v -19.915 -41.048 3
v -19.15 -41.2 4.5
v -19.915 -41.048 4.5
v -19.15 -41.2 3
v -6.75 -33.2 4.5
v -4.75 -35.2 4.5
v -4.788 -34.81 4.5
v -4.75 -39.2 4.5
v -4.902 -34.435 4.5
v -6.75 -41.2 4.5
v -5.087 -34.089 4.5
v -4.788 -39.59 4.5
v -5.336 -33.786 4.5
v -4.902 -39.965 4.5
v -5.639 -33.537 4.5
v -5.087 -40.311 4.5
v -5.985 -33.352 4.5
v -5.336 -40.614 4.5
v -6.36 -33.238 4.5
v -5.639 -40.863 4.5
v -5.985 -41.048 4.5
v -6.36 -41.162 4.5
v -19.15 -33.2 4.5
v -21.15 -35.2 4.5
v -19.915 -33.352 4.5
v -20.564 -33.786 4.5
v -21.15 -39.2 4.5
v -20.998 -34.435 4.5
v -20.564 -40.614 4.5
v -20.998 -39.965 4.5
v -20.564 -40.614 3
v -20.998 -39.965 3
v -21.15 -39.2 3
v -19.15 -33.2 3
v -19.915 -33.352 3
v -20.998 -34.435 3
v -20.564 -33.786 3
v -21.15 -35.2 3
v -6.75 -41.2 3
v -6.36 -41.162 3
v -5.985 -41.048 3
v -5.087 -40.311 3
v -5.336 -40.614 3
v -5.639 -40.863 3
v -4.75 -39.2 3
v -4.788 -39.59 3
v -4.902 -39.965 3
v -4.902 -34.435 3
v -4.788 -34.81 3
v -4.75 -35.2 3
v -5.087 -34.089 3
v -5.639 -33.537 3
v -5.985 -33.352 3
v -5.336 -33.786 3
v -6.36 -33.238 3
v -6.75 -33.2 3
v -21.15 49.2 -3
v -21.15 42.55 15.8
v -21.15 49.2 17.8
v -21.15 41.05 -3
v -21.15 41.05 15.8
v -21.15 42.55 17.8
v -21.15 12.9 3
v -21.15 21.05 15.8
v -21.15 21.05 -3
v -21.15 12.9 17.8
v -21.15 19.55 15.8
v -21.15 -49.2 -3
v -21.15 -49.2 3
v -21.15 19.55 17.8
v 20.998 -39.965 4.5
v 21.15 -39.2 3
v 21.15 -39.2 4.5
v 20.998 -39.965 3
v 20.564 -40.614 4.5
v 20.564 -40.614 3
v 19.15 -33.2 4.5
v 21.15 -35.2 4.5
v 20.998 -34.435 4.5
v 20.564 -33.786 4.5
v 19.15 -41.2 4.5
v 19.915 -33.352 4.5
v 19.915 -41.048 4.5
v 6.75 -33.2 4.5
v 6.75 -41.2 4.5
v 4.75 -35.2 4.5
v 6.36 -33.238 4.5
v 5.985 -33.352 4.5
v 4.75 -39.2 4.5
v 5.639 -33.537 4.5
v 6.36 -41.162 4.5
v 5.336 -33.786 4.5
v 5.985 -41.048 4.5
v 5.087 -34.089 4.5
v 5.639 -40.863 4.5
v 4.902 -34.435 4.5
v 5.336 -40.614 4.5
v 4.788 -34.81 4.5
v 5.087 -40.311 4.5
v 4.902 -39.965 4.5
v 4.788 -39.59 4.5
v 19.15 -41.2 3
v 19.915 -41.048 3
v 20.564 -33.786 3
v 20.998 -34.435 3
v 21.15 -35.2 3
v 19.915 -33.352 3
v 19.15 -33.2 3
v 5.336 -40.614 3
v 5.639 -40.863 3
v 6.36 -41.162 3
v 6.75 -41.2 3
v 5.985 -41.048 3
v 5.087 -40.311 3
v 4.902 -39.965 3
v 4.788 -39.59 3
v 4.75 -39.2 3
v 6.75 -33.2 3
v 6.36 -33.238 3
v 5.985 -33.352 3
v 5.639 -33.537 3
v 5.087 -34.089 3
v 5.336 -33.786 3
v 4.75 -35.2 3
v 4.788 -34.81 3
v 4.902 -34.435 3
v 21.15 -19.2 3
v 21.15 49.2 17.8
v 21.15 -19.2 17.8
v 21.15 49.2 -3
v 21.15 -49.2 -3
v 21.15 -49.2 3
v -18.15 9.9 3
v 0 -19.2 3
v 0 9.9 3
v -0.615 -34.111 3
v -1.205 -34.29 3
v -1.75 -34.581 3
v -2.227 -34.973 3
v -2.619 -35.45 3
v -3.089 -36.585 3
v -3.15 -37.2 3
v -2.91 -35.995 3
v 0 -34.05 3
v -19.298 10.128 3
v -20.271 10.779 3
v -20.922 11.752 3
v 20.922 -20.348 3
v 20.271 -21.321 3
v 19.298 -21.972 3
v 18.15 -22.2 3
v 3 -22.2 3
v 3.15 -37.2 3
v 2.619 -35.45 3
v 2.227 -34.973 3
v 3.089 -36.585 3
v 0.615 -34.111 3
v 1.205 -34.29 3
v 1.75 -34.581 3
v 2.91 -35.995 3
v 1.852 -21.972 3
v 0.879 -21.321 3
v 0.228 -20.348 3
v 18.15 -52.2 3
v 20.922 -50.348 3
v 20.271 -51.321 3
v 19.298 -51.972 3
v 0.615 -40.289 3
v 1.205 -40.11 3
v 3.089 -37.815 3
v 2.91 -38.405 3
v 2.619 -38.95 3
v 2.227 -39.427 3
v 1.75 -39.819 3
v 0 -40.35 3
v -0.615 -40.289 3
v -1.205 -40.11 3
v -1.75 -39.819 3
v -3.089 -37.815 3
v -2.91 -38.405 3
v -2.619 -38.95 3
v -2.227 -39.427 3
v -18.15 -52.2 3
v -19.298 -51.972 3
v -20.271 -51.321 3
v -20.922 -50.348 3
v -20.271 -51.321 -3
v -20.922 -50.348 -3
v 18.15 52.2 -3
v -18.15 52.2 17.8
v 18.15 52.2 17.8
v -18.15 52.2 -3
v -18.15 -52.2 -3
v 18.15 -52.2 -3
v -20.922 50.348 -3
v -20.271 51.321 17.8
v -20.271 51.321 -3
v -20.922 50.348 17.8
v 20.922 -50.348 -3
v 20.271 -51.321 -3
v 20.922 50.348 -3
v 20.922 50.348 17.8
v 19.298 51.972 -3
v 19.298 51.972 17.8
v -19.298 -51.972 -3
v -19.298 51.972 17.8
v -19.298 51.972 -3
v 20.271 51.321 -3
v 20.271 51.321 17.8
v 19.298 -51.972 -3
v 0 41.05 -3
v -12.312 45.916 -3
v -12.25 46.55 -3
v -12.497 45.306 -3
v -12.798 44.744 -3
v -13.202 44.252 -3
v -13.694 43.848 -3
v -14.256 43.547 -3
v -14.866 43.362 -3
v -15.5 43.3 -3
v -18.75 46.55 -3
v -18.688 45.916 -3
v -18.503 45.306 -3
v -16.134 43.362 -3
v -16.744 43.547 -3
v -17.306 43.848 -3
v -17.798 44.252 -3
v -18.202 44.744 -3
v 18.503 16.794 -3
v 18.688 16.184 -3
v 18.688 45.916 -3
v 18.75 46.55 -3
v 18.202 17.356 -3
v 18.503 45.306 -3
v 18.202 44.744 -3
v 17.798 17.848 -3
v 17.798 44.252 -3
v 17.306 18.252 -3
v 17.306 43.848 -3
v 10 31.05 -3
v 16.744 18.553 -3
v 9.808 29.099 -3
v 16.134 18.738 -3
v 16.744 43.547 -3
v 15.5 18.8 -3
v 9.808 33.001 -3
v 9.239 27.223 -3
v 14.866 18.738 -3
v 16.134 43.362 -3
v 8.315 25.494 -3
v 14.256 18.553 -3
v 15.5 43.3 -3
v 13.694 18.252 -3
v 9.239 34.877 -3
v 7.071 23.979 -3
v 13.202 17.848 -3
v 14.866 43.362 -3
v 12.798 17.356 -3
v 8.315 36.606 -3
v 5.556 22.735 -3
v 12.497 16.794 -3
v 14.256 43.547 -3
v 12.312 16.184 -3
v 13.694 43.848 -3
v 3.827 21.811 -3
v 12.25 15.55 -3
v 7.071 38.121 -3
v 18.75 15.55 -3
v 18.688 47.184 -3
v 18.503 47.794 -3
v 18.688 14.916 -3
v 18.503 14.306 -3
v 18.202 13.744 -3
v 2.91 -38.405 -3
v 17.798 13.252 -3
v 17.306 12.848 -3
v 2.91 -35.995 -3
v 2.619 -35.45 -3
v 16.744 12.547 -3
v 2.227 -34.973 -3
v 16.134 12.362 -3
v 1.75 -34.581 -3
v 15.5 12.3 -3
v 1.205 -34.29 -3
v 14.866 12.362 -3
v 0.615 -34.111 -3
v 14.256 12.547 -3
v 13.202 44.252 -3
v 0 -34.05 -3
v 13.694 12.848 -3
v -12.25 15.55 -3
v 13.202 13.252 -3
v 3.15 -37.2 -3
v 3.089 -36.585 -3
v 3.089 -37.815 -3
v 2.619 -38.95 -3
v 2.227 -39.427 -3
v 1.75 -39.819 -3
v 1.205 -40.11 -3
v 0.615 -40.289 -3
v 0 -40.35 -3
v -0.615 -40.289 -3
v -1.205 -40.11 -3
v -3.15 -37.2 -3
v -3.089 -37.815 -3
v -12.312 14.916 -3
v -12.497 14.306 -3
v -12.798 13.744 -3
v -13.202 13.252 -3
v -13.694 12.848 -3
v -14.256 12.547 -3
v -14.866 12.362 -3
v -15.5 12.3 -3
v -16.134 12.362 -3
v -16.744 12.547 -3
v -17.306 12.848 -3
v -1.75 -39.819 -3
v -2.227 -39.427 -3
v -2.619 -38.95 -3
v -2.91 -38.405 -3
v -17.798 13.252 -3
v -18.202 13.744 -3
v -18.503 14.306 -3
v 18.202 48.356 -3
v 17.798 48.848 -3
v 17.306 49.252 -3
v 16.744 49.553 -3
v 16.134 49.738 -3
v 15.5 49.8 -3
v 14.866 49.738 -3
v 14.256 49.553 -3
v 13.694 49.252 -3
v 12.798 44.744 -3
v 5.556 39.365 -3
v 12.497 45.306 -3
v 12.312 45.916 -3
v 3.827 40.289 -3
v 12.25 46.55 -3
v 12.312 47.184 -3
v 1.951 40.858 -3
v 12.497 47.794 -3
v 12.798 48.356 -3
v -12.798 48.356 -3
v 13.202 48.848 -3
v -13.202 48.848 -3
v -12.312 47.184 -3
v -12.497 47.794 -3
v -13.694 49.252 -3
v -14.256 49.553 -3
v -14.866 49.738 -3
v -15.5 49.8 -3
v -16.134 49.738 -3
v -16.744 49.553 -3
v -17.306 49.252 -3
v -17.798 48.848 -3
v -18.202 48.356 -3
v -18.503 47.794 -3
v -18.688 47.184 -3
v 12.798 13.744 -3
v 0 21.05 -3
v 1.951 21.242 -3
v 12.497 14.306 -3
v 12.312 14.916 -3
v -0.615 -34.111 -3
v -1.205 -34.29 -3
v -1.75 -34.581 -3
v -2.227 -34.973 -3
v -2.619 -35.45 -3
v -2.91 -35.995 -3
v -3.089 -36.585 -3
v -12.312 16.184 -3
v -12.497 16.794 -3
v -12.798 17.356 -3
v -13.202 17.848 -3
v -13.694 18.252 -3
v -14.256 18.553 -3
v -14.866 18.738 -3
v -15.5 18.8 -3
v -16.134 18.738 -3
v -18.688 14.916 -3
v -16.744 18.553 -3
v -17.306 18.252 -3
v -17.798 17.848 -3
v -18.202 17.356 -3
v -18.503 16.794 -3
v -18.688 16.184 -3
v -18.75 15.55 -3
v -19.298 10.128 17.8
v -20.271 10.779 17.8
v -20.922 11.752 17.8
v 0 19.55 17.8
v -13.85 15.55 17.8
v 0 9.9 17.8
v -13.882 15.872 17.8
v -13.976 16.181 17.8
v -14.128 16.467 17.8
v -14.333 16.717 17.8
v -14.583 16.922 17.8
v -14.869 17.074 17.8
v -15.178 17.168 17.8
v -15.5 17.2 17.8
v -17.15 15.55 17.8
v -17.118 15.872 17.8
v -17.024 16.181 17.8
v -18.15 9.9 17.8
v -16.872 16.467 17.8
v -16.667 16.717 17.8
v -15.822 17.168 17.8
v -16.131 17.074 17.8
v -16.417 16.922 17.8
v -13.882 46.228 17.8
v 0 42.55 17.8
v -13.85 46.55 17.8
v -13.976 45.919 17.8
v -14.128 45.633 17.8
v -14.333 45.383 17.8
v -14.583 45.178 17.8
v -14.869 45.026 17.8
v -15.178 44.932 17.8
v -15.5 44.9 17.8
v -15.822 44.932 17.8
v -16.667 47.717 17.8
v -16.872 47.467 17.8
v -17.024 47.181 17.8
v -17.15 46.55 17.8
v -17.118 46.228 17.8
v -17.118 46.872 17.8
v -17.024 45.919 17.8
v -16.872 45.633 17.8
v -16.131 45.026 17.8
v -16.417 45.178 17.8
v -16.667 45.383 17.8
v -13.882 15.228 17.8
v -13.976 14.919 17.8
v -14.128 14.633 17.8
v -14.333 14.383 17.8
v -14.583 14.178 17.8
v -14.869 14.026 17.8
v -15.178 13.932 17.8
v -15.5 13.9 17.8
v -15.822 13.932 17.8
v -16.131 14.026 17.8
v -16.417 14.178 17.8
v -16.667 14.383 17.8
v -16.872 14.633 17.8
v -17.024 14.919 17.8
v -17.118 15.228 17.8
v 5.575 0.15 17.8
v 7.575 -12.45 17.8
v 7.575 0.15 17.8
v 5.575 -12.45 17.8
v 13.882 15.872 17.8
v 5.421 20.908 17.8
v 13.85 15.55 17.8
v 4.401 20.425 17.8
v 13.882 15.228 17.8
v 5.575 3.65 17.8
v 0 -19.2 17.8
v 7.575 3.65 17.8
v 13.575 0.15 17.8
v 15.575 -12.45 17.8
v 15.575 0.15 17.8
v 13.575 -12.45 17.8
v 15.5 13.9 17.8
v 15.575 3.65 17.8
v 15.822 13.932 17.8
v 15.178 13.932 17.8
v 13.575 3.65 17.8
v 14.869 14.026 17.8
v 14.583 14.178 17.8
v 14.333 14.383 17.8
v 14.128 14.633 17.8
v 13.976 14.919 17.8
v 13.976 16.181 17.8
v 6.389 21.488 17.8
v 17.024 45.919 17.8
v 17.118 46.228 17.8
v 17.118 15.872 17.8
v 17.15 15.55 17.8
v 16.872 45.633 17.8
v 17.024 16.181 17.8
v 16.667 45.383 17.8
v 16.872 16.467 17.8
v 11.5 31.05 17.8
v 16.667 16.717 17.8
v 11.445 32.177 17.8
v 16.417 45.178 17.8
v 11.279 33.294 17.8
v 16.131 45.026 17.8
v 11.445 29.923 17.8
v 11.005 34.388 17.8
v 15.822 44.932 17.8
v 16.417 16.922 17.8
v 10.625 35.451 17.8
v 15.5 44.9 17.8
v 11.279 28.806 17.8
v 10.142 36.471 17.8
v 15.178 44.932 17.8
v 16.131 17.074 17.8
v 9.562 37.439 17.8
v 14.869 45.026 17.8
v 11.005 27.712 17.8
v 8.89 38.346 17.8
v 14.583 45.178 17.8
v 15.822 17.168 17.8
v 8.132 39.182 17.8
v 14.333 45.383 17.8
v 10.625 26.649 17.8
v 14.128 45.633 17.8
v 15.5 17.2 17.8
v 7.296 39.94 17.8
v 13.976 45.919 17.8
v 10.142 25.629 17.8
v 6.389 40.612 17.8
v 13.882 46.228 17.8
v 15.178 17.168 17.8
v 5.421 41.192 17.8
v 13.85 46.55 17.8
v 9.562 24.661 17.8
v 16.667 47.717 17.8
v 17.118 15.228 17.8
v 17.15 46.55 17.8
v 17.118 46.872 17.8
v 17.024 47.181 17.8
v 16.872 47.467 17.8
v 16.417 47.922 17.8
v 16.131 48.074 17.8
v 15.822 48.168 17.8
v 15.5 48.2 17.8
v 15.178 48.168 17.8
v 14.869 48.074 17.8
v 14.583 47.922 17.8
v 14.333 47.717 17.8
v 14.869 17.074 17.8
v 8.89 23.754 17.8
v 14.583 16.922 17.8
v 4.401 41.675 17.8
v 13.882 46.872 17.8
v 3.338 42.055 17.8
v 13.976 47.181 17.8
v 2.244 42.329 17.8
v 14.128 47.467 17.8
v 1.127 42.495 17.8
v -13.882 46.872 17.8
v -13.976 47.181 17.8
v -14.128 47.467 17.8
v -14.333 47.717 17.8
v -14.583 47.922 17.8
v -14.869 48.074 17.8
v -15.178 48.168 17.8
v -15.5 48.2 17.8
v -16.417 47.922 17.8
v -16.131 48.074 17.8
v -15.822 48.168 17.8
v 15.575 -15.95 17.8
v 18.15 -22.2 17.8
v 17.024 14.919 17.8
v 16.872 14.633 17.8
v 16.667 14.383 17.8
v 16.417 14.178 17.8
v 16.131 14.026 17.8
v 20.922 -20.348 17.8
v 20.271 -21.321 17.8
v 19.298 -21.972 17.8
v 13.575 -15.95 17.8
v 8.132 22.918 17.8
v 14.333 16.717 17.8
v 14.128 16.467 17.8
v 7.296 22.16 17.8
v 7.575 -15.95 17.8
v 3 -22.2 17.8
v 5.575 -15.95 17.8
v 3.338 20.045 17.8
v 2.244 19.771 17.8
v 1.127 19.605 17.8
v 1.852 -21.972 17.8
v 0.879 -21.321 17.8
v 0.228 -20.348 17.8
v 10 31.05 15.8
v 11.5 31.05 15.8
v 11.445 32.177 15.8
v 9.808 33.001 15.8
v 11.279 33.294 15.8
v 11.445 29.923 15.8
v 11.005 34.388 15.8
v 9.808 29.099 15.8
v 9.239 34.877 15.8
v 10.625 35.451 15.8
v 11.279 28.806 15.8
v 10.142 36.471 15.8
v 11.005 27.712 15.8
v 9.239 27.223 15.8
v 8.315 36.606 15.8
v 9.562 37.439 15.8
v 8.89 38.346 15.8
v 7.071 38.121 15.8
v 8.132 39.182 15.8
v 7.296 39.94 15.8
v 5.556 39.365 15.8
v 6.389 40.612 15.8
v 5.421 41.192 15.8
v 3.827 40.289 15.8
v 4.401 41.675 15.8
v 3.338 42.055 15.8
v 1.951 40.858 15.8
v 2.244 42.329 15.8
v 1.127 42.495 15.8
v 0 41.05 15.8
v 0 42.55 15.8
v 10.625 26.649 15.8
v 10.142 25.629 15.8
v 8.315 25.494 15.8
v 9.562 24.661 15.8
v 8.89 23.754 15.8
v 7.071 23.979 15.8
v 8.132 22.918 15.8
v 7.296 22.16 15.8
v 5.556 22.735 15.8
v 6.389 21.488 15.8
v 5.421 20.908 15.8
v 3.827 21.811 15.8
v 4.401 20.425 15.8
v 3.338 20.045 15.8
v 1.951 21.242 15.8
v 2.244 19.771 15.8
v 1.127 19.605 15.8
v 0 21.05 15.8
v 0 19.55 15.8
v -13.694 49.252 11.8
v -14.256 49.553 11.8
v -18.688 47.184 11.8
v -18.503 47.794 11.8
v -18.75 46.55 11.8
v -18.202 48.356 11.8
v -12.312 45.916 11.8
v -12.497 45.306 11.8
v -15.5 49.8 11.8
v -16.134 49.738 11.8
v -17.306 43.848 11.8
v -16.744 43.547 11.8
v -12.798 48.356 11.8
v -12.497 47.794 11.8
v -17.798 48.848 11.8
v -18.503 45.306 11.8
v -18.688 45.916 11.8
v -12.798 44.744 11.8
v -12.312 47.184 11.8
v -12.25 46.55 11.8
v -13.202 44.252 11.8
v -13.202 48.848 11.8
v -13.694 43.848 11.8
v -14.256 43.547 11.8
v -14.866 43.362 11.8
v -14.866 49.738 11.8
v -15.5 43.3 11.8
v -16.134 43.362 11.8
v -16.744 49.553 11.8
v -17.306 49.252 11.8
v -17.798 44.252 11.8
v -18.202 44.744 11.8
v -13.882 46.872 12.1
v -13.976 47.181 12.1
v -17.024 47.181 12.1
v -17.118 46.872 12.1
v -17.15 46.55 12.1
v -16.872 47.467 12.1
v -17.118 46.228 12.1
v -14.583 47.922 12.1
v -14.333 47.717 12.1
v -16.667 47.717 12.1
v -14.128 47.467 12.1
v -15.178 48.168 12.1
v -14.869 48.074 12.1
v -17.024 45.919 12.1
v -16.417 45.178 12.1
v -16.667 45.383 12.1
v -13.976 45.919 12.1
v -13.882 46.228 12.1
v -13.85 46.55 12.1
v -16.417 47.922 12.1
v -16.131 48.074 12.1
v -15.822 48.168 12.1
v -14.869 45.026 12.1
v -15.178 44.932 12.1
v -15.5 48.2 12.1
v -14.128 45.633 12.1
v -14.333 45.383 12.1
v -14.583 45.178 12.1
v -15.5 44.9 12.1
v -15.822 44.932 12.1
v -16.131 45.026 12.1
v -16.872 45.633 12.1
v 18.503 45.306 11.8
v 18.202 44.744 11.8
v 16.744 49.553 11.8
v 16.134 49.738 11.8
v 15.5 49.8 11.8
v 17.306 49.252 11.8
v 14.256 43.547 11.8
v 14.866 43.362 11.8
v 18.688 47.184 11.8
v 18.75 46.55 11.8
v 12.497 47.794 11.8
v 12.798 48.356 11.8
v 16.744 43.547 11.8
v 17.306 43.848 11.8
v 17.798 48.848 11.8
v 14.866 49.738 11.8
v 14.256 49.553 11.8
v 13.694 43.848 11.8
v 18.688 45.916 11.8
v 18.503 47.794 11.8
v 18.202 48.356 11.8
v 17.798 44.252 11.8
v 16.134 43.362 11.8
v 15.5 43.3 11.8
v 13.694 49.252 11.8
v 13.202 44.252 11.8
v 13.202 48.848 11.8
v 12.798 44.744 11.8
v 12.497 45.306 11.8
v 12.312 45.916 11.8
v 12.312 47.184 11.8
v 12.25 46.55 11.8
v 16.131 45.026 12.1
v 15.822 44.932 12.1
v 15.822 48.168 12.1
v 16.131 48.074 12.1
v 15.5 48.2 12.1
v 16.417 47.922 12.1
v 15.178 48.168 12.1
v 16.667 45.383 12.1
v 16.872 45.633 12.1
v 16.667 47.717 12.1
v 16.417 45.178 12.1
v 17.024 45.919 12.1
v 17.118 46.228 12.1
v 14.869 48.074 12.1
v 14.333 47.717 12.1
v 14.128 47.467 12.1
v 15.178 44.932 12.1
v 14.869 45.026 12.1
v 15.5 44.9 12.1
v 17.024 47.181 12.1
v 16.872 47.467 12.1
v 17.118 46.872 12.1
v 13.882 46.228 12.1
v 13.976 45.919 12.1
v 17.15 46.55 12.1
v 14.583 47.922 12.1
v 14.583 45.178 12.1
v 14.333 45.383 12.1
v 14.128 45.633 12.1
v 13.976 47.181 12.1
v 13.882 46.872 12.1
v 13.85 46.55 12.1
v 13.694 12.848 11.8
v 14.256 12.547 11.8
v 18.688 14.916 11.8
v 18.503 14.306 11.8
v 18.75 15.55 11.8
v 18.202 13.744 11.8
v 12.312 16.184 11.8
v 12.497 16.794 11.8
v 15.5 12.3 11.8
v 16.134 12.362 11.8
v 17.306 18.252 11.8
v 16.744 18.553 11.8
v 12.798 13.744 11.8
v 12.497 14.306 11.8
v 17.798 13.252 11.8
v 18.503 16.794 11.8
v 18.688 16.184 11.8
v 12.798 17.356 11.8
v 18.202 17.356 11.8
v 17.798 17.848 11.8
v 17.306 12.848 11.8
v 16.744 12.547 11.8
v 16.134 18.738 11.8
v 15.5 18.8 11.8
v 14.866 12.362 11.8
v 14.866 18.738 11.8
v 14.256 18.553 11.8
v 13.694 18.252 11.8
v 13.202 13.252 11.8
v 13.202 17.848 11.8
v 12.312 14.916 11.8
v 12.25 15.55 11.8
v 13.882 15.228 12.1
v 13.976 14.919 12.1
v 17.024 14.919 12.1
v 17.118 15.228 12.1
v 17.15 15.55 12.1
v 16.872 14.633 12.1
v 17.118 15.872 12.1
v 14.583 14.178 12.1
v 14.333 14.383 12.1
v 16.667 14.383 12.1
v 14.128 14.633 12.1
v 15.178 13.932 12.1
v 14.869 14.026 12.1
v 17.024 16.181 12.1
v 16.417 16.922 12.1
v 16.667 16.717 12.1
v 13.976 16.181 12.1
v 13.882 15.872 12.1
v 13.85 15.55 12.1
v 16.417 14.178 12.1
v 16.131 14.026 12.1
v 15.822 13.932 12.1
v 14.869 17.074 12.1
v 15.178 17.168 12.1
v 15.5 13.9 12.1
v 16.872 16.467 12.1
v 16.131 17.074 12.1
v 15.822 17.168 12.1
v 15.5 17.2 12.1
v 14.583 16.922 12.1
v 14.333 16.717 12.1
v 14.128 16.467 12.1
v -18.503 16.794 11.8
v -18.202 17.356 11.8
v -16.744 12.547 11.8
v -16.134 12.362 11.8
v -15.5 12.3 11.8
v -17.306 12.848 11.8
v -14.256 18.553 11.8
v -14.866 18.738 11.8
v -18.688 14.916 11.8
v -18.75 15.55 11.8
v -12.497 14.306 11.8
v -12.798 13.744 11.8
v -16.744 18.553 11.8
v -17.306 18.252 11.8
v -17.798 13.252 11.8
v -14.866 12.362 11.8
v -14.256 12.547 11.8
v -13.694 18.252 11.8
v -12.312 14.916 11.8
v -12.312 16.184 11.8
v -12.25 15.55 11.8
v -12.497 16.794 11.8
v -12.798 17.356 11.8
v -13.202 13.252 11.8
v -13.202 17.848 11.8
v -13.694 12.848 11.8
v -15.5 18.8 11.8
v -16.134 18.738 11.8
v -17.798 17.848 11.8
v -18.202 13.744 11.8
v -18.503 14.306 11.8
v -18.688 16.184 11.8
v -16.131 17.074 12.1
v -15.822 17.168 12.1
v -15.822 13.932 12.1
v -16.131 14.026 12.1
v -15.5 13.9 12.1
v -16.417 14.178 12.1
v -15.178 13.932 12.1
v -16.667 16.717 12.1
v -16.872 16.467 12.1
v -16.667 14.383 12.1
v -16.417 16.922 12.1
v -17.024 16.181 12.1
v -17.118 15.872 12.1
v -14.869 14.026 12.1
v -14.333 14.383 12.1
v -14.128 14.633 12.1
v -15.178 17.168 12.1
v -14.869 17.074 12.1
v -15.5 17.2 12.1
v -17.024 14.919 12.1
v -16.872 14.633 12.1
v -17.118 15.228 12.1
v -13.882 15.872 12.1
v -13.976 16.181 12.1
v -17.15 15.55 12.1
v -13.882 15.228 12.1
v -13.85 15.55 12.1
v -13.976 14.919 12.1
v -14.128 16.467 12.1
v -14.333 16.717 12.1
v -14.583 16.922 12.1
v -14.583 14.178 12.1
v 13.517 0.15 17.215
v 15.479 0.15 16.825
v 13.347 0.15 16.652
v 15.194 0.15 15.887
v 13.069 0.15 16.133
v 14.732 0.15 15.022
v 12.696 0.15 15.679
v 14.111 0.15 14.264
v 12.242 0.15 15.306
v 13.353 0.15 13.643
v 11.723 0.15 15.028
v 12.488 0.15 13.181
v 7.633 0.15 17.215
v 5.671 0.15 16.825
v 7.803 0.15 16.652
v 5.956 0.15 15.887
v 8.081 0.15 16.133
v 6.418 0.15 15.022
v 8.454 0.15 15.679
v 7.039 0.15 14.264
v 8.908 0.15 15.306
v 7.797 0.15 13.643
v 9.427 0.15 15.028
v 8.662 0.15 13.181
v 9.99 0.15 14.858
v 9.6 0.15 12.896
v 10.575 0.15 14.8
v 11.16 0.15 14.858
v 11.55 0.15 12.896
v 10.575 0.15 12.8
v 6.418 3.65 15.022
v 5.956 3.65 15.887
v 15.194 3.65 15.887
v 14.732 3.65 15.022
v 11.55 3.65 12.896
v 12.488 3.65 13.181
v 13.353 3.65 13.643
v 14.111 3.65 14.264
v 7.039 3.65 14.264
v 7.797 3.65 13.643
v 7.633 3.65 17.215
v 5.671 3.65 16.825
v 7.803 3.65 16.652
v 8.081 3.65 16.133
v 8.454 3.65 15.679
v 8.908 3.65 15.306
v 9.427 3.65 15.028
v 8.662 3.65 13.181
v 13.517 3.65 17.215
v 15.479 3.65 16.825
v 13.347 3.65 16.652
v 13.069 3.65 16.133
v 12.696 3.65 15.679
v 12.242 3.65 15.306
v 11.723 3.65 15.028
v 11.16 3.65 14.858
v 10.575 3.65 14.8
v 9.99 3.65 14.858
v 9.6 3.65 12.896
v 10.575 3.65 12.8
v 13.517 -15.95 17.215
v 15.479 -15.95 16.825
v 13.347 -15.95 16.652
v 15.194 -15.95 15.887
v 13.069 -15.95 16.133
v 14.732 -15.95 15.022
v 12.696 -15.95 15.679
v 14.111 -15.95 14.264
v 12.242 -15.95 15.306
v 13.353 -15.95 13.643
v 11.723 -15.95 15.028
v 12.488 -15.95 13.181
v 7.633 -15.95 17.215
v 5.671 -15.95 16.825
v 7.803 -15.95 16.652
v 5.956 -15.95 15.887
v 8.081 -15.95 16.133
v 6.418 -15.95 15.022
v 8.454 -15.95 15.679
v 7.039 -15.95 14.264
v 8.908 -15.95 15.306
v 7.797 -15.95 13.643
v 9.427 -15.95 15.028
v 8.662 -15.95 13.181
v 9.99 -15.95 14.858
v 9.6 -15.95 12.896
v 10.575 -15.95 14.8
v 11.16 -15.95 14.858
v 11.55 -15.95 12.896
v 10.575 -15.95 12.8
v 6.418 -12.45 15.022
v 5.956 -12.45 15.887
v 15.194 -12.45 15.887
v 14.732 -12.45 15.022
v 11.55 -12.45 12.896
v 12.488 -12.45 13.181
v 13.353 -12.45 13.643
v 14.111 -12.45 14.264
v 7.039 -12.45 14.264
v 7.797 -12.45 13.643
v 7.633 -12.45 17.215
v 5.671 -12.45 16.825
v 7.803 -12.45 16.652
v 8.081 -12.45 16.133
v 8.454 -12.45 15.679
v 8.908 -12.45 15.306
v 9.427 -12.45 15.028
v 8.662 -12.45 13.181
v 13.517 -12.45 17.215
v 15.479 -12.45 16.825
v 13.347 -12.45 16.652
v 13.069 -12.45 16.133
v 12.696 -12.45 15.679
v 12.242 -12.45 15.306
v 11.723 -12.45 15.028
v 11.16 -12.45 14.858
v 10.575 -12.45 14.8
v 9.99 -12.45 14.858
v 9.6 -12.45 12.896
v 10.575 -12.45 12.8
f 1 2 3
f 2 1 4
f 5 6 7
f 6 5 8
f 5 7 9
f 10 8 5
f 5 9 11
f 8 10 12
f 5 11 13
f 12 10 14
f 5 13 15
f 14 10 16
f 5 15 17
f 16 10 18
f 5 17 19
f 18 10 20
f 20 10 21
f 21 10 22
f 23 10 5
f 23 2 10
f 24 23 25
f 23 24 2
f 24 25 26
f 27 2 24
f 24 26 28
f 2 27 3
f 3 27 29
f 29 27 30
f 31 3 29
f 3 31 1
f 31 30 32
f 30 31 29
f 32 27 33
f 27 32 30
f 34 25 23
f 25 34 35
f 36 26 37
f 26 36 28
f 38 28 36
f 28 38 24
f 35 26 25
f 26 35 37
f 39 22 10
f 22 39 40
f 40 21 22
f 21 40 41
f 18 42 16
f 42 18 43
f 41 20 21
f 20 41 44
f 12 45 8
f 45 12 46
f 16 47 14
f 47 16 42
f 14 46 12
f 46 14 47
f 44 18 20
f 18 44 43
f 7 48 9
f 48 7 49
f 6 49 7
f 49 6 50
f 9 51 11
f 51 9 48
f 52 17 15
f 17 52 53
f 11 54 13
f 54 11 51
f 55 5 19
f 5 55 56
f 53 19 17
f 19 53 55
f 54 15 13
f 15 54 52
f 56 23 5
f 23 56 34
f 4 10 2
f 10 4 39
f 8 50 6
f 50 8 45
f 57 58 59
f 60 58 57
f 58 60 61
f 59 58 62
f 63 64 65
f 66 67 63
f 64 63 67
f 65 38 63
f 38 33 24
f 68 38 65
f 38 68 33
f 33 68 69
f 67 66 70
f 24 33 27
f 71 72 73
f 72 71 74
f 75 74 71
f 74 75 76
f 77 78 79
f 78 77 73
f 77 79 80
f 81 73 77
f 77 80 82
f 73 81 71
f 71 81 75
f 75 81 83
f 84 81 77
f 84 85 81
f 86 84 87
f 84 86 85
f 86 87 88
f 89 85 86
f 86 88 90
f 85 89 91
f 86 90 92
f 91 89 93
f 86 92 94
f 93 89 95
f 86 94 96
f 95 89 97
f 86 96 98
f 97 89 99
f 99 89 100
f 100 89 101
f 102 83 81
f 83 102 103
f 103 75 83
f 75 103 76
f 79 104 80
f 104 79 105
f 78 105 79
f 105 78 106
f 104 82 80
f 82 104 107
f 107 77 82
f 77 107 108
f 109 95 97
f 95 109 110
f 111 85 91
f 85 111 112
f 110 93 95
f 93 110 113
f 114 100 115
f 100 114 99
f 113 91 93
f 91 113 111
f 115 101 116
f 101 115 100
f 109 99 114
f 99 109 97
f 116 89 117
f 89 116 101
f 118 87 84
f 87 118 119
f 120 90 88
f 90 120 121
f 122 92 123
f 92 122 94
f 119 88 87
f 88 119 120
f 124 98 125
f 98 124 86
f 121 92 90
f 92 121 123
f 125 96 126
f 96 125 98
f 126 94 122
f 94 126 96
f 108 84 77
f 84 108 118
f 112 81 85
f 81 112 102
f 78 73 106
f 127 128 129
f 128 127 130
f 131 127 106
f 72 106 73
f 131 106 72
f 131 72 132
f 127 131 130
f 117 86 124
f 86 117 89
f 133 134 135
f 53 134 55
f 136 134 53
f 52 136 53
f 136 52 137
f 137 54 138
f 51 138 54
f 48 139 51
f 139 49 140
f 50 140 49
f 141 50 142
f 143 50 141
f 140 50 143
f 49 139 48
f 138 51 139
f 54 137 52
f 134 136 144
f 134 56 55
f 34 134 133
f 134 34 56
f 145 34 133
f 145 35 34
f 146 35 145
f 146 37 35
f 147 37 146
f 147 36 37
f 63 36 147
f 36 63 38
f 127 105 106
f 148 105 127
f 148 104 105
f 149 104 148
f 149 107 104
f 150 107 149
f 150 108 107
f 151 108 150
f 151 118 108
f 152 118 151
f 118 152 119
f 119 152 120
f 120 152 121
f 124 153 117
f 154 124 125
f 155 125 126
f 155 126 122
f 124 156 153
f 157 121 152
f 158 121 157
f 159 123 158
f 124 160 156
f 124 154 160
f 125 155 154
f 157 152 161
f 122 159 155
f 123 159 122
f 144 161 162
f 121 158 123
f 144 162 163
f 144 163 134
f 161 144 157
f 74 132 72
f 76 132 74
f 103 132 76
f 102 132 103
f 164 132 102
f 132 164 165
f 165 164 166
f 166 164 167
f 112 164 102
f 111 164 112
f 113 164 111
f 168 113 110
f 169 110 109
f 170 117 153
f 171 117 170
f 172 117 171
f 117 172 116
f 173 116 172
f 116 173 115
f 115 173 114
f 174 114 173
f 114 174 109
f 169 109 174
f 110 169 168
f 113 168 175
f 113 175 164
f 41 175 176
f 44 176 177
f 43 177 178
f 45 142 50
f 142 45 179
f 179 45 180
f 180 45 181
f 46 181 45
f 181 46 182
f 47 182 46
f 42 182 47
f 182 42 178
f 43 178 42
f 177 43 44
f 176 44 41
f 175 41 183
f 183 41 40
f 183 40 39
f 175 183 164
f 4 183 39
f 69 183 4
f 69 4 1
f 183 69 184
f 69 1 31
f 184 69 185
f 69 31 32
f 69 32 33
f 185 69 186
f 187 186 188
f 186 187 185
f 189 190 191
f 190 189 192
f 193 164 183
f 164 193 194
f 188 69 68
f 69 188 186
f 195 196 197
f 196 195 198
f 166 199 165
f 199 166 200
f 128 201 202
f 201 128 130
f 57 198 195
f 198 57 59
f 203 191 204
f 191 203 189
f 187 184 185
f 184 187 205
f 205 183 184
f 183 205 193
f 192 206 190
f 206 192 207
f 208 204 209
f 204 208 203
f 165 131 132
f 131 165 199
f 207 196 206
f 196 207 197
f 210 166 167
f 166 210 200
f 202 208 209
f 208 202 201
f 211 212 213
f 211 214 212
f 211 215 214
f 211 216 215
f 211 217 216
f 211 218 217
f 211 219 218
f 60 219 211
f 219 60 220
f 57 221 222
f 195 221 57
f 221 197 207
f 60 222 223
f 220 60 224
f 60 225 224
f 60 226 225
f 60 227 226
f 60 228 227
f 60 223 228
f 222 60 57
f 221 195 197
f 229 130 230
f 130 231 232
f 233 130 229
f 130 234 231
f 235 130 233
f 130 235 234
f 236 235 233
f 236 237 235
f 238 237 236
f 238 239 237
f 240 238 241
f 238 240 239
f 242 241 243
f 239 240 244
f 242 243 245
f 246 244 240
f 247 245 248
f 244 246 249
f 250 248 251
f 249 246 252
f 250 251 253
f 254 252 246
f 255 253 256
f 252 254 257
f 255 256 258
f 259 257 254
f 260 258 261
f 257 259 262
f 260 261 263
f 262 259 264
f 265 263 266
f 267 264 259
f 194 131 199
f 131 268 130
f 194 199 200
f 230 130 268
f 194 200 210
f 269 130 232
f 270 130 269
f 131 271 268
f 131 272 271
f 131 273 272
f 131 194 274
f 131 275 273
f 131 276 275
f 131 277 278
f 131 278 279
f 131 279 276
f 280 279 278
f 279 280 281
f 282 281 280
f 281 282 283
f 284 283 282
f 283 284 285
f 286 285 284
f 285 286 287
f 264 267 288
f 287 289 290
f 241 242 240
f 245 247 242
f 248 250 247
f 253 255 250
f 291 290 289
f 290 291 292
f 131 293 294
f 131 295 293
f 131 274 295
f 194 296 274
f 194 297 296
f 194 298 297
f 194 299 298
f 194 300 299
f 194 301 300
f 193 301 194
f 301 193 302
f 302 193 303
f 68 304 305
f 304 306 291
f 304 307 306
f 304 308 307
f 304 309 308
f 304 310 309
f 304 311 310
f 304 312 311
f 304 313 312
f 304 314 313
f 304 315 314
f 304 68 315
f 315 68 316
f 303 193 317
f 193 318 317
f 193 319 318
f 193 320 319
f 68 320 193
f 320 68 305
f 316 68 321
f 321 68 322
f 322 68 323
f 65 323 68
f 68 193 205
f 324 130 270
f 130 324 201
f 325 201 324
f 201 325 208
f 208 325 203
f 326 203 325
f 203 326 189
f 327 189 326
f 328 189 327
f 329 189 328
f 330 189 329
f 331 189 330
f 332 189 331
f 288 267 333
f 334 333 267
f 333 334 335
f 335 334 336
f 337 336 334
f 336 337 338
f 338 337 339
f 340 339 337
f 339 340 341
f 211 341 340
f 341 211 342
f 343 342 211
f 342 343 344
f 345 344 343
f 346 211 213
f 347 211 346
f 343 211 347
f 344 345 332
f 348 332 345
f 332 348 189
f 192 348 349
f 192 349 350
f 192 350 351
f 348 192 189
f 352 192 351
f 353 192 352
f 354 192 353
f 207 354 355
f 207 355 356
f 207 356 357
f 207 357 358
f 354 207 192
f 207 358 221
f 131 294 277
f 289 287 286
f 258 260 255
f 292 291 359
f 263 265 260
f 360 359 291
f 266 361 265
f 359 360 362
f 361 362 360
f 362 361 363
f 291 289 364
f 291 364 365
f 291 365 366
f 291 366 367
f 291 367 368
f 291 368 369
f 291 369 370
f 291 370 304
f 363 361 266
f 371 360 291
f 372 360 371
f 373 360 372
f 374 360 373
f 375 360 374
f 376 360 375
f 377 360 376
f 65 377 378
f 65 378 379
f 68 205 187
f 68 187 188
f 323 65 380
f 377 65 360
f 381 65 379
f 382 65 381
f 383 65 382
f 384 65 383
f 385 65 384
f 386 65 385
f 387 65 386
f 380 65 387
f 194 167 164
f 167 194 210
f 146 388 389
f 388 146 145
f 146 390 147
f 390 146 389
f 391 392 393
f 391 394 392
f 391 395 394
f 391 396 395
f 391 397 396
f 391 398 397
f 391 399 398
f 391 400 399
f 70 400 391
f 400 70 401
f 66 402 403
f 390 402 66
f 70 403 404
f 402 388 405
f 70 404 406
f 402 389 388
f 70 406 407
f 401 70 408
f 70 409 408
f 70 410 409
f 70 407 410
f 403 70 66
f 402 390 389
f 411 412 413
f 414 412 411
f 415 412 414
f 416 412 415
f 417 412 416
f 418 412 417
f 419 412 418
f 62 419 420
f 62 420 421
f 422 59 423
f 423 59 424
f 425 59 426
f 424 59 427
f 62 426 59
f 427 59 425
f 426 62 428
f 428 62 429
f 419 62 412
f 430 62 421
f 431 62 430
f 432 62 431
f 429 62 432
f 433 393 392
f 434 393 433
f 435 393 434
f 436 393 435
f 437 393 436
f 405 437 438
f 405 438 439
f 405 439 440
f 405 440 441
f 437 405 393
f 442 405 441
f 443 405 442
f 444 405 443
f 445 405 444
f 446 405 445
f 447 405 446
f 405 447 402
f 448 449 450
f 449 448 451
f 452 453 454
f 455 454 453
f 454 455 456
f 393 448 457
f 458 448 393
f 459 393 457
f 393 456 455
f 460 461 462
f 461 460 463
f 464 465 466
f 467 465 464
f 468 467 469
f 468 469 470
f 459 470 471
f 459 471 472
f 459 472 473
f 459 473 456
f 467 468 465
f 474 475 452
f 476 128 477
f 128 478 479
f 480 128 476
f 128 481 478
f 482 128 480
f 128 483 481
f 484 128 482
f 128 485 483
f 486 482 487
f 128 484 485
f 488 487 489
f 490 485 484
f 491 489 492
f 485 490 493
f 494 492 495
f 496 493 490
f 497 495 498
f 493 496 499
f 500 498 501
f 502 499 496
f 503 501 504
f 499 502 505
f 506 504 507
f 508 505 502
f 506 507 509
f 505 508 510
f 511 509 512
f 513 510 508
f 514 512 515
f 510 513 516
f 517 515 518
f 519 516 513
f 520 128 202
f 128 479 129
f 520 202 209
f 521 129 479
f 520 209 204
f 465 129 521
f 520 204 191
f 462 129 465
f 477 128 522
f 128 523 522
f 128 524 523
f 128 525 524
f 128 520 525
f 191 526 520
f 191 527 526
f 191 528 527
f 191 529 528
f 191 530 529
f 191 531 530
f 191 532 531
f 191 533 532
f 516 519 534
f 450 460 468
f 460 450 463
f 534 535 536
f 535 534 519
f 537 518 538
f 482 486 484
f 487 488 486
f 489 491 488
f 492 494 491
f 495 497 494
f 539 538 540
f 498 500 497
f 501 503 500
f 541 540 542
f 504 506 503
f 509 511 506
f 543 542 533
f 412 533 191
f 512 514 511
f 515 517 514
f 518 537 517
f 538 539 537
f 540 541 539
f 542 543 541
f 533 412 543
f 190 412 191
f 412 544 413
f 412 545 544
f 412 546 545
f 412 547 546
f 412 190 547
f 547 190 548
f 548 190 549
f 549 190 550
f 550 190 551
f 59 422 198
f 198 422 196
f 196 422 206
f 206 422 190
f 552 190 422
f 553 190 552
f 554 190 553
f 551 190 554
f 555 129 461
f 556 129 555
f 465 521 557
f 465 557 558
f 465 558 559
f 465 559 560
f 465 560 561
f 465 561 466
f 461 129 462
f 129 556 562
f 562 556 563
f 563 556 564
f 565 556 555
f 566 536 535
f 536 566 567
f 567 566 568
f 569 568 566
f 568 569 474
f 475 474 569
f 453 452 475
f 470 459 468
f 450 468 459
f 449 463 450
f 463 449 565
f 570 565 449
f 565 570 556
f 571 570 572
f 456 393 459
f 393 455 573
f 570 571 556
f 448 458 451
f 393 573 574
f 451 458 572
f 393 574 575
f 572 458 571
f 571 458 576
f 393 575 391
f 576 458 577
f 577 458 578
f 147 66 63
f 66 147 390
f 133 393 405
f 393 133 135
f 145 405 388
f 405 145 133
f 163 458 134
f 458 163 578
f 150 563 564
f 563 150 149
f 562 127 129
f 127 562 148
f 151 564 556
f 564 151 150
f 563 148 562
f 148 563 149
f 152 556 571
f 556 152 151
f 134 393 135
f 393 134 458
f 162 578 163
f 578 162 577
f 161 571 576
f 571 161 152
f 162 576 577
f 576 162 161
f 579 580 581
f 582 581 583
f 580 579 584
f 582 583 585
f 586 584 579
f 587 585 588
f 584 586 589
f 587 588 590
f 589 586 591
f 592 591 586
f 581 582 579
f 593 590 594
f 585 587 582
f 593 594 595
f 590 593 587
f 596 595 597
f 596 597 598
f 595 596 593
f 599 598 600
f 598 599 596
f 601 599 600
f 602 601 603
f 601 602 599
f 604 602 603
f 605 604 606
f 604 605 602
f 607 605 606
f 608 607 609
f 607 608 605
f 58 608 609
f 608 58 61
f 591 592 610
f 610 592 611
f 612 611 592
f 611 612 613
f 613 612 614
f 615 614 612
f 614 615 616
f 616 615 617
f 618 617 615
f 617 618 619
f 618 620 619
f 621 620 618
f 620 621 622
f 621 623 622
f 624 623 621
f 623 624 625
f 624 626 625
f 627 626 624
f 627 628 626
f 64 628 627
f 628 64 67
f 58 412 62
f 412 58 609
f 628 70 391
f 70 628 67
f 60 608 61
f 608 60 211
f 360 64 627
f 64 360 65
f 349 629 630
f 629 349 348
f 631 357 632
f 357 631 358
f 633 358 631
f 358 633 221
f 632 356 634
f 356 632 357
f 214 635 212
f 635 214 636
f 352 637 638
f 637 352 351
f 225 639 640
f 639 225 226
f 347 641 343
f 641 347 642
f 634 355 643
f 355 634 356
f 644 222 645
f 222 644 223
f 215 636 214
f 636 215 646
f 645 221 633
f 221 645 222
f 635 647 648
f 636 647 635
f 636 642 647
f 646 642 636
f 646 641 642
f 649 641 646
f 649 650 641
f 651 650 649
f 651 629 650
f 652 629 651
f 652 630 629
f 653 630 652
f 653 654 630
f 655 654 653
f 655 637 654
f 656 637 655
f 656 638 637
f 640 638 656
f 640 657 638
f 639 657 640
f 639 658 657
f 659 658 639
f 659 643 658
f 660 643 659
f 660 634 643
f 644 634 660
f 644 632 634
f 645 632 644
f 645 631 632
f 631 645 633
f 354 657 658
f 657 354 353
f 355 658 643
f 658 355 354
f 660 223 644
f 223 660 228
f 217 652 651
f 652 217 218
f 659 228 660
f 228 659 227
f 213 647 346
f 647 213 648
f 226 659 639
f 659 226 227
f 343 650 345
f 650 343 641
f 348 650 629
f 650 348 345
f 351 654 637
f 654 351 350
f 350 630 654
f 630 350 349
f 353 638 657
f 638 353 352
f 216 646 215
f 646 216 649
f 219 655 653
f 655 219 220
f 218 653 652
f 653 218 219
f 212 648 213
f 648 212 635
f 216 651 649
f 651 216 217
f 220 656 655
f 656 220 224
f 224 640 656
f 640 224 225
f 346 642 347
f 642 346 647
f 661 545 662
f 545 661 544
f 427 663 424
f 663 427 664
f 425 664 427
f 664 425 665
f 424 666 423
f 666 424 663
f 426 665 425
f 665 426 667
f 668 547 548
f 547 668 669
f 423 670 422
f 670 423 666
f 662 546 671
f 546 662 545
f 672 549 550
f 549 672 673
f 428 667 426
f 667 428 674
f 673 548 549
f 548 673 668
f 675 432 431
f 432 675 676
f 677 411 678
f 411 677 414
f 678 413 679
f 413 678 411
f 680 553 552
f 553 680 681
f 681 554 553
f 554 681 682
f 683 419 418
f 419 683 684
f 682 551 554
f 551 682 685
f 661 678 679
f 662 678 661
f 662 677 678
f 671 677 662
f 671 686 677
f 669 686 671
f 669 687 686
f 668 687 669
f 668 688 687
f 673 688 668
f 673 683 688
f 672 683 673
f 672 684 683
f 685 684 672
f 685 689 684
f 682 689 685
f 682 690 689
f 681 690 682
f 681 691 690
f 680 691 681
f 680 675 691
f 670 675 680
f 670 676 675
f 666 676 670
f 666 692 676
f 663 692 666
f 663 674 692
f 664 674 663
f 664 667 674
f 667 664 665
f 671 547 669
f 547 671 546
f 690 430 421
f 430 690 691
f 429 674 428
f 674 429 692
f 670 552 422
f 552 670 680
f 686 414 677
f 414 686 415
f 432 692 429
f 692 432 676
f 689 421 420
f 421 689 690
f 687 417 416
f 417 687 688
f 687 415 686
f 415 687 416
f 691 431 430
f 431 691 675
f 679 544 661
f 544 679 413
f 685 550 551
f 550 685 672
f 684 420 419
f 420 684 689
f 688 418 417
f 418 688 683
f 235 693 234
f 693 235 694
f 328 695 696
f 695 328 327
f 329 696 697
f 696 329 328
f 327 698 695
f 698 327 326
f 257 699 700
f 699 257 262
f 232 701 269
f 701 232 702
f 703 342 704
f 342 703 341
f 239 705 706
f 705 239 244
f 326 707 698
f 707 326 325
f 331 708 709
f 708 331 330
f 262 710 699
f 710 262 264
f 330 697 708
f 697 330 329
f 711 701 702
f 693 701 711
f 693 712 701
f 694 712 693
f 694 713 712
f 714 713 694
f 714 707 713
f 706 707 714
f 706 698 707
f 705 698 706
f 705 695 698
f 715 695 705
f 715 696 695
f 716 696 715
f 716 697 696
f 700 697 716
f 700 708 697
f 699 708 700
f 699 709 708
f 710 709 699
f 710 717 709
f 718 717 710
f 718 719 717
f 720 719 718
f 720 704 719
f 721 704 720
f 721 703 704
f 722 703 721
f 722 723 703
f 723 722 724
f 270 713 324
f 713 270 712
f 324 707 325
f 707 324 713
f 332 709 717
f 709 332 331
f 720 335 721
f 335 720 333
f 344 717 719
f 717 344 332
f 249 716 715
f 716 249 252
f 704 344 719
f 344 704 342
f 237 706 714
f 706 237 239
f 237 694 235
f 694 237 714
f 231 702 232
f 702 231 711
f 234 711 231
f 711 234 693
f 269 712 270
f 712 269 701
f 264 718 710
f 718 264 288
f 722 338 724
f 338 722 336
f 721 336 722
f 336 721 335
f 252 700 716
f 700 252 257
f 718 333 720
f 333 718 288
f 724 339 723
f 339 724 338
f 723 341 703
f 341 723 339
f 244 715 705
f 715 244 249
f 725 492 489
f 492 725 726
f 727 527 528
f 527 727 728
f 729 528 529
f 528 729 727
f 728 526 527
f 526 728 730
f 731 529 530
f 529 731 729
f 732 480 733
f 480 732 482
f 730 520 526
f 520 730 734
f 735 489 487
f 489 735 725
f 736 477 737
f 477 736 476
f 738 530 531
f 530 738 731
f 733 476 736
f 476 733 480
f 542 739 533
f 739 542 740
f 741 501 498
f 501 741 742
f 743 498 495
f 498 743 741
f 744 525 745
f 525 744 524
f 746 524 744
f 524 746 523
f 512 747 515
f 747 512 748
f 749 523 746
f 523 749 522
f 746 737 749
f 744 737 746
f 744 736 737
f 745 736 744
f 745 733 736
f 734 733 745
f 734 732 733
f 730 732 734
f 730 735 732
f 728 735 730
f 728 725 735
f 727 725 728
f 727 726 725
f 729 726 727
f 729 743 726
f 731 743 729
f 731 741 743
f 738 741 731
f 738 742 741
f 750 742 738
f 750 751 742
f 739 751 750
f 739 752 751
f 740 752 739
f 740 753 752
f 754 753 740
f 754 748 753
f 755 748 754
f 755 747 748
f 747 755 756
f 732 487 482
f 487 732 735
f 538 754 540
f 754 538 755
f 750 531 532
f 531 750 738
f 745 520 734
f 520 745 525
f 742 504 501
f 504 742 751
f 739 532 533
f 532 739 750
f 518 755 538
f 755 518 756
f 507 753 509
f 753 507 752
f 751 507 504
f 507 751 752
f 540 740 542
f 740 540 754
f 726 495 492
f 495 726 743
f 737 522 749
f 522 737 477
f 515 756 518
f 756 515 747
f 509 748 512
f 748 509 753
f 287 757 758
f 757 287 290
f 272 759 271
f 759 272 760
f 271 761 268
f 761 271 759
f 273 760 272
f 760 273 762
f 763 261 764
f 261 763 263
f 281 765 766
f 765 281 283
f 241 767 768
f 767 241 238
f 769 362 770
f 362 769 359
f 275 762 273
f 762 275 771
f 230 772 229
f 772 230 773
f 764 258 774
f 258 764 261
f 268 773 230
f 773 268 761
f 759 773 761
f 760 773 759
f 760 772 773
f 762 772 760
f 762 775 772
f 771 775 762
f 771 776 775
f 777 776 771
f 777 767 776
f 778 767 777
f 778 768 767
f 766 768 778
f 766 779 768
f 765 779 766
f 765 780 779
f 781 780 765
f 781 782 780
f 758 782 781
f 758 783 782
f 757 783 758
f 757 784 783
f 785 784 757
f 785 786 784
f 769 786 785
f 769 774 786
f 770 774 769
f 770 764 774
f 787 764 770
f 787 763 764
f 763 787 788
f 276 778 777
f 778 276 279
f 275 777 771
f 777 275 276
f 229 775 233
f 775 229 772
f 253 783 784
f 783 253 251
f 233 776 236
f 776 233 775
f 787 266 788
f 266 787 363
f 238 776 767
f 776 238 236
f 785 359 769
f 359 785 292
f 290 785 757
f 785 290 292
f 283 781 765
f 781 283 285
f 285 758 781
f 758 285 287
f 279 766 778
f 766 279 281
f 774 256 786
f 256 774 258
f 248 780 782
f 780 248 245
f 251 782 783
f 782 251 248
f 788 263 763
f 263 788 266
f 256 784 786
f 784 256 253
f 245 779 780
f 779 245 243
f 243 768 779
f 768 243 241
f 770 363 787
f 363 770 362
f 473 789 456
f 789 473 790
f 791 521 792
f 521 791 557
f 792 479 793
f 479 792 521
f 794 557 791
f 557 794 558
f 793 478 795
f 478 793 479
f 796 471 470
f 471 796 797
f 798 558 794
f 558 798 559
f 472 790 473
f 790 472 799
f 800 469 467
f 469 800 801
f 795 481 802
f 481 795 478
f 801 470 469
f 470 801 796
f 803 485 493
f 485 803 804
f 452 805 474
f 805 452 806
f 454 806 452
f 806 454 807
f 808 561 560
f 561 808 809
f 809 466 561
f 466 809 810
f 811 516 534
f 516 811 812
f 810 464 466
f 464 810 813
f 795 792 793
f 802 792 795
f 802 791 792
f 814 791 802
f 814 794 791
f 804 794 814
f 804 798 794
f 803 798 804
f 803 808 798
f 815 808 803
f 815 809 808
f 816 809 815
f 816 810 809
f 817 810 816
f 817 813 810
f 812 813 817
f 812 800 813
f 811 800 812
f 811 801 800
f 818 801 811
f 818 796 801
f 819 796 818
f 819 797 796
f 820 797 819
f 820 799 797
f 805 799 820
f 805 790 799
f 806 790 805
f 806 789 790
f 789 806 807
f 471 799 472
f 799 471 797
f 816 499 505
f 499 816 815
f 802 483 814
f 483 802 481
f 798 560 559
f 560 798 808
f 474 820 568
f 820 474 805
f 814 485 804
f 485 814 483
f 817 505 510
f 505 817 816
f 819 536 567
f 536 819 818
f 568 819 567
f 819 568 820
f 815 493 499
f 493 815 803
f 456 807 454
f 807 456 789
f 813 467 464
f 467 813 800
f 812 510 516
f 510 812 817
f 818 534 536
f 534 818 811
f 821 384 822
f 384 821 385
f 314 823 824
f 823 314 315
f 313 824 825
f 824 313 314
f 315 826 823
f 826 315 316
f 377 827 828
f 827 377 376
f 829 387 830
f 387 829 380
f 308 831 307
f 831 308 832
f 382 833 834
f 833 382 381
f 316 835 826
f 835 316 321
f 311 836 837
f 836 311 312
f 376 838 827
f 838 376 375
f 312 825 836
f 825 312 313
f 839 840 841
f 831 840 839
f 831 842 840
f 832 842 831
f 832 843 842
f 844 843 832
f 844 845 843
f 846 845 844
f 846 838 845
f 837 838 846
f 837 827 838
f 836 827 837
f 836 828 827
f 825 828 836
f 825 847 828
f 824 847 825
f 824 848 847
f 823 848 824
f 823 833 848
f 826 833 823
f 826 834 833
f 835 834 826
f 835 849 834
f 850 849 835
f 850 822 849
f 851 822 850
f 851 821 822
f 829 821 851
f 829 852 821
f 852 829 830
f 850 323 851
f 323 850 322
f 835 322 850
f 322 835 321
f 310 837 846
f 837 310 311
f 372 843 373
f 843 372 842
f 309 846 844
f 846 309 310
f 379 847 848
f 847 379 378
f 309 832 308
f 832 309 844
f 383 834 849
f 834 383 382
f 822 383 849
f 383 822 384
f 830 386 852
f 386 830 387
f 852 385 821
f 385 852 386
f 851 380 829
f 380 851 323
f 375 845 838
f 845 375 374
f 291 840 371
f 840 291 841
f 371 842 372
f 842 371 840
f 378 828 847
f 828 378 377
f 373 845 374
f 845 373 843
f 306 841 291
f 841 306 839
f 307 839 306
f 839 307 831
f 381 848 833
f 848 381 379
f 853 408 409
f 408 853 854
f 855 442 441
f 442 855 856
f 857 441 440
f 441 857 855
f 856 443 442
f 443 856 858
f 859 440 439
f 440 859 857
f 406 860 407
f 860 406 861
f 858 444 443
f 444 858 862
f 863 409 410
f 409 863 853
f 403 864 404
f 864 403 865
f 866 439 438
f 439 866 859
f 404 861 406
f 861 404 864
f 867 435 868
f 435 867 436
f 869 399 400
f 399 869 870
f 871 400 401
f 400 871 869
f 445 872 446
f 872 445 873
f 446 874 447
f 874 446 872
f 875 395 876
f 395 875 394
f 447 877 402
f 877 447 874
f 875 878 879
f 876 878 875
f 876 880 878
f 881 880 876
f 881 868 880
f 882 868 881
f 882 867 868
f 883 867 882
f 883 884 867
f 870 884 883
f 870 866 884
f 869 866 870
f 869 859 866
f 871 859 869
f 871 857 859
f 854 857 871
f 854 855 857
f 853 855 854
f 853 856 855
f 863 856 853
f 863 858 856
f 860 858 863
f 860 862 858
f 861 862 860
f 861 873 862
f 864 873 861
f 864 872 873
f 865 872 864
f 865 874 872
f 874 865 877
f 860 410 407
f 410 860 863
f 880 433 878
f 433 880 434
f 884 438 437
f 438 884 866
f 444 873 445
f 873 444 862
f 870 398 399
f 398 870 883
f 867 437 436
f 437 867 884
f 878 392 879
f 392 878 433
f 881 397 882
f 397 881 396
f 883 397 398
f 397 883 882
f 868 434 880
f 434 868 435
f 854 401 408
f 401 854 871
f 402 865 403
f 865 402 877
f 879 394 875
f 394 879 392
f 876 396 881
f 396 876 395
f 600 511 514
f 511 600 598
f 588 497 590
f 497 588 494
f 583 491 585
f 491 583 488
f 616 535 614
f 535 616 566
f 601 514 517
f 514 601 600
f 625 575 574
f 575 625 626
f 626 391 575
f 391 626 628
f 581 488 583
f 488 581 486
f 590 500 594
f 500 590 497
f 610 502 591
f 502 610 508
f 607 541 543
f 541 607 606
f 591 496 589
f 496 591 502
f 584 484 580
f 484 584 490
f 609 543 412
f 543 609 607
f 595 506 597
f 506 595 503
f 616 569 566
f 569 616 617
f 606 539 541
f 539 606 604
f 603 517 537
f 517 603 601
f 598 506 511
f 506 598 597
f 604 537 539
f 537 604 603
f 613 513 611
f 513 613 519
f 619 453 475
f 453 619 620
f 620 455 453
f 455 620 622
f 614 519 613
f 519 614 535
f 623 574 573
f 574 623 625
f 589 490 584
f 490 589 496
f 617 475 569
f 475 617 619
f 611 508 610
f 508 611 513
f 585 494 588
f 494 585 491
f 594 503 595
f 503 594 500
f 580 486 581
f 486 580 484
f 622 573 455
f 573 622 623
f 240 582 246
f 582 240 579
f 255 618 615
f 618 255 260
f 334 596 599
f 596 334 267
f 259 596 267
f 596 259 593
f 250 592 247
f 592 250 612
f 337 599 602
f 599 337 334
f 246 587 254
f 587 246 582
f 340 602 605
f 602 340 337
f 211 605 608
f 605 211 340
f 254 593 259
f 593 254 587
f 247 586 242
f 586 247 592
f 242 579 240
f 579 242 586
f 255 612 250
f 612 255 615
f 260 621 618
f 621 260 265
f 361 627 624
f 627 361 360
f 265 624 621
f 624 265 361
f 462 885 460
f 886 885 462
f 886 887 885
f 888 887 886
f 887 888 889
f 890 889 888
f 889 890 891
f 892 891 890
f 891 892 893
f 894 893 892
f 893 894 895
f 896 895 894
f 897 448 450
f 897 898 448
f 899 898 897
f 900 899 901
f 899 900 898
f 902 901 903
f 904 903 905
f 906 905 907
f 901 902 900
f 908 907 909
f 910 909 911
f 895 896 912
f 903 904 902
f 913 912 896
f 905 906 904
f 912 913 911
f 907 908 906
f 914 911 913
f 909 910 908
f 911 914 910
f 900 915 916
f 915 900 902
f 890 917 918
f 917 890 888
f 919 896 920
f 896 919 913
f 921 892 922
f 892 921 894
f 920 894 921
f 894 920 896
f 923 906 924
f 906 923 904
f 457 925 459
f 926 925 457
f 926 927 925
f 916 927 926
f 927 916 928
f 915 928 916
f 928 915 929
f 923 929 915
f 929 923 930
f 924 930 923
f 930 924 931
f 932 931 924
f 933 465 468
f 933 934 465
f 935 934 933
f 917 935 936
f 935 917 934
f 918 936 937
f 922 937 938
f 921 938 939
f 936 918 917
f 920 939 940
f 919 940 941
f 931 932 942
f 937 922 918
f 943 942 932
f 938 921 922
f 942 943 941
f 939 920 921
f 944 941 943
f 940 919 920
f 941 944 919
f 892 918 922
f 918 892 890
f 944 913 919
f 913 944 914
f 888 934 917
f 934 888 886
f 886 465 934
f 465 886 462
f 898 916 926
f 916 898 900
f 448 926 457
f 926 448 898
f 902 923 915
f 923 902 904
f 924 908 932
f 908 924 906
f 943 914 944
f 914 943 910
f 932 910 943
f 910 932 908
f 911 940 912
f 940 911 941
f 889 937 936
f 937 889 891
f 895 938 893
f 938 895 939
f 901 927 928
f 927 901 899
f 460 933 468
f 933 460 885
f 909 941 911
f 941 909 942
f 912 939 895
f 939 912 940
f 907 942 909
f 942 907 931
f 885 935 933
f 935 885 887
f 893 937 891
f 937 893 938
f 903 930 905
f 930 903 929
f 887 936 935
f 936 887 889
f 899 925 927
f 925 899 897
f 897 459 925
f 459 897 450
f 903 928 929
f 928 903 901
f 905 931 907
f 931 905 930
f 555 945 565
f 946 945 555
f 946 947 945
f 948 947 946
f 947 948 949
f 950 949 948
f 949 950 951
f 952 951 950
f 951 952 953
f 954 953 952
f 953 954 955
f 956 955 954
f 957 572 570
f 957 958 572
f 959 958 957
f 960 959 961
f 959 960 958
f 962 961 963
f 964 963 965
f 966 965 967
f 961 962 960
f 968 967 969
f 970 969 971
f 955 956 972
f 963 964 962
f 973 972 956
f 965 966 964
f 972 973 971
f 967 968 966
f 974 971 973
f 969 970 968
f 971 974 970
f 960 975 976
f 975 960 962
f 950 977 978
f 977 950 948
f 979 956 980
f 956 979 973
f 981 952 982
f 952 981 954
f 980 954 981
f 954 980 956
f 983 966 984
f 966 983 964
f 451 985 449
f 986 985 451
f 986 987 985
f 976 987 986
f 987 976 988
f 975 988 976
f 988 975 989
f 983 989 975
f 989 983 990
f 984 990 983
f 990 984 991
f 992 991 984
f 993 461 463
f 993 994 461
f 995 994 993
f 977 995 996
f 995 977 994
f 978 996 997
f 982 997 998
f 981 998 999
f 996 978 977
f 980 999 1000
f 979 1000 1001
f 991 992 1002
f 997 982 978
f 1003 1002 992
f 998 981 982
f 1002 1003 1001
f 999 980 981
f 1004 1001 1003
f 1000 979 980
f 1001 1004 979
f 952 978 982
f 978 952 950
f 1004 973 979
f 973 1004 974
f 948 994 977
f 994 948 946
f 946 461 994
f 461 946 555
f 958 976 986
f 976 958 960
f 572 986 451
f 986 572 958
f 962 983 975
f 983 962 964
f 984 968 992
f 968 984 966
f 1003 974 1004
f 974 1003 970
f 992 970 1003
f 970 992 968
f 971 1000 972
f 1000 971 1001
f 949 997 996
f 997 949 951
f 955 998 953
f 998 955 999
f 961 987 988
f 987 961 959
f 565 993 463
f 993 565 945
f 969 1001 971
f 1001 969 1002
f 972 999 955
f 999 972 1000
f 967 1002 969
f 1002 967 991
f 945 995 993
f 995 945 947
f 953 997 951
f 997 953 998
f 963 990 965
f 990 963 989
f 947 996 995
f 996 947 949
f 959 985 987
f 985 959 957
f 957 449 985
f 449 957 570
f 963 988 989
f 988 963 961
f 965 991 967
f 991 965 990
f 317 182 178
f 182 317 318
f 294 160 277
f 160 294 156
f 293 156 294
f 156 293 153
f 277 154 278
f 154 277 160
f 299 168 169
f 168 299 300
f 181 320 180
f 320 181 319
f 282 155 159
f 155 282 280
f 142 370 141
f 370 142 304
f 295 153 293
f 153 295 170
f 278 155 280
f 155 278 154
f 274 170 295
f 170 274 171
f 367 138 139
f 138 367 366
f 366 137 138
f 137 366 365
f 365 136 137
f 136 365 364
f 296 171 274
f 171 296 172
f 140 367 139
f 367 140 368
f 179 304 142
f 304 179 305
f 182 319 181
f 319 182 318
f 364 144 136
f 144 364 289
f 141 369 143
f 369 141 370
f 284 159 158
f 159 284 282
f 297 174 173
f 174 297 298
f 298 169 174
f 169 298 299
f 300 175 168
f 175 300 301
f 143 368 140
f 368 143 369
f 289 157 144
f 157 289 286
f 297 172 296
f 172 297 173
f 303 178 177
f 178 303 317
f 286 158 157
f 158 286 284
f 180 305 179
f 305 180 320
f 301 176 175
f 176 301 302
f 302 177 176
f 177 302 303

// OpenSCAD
/* 
   === RebeliX BoX ===

   z motor holder
   GNU GPL v3
   Martin Neruda <neruda@RebeliX.cz>
   http://www.RebeliX.cz
*/

use <z_leadscrew_holder.scad>

z_motor_holder();
